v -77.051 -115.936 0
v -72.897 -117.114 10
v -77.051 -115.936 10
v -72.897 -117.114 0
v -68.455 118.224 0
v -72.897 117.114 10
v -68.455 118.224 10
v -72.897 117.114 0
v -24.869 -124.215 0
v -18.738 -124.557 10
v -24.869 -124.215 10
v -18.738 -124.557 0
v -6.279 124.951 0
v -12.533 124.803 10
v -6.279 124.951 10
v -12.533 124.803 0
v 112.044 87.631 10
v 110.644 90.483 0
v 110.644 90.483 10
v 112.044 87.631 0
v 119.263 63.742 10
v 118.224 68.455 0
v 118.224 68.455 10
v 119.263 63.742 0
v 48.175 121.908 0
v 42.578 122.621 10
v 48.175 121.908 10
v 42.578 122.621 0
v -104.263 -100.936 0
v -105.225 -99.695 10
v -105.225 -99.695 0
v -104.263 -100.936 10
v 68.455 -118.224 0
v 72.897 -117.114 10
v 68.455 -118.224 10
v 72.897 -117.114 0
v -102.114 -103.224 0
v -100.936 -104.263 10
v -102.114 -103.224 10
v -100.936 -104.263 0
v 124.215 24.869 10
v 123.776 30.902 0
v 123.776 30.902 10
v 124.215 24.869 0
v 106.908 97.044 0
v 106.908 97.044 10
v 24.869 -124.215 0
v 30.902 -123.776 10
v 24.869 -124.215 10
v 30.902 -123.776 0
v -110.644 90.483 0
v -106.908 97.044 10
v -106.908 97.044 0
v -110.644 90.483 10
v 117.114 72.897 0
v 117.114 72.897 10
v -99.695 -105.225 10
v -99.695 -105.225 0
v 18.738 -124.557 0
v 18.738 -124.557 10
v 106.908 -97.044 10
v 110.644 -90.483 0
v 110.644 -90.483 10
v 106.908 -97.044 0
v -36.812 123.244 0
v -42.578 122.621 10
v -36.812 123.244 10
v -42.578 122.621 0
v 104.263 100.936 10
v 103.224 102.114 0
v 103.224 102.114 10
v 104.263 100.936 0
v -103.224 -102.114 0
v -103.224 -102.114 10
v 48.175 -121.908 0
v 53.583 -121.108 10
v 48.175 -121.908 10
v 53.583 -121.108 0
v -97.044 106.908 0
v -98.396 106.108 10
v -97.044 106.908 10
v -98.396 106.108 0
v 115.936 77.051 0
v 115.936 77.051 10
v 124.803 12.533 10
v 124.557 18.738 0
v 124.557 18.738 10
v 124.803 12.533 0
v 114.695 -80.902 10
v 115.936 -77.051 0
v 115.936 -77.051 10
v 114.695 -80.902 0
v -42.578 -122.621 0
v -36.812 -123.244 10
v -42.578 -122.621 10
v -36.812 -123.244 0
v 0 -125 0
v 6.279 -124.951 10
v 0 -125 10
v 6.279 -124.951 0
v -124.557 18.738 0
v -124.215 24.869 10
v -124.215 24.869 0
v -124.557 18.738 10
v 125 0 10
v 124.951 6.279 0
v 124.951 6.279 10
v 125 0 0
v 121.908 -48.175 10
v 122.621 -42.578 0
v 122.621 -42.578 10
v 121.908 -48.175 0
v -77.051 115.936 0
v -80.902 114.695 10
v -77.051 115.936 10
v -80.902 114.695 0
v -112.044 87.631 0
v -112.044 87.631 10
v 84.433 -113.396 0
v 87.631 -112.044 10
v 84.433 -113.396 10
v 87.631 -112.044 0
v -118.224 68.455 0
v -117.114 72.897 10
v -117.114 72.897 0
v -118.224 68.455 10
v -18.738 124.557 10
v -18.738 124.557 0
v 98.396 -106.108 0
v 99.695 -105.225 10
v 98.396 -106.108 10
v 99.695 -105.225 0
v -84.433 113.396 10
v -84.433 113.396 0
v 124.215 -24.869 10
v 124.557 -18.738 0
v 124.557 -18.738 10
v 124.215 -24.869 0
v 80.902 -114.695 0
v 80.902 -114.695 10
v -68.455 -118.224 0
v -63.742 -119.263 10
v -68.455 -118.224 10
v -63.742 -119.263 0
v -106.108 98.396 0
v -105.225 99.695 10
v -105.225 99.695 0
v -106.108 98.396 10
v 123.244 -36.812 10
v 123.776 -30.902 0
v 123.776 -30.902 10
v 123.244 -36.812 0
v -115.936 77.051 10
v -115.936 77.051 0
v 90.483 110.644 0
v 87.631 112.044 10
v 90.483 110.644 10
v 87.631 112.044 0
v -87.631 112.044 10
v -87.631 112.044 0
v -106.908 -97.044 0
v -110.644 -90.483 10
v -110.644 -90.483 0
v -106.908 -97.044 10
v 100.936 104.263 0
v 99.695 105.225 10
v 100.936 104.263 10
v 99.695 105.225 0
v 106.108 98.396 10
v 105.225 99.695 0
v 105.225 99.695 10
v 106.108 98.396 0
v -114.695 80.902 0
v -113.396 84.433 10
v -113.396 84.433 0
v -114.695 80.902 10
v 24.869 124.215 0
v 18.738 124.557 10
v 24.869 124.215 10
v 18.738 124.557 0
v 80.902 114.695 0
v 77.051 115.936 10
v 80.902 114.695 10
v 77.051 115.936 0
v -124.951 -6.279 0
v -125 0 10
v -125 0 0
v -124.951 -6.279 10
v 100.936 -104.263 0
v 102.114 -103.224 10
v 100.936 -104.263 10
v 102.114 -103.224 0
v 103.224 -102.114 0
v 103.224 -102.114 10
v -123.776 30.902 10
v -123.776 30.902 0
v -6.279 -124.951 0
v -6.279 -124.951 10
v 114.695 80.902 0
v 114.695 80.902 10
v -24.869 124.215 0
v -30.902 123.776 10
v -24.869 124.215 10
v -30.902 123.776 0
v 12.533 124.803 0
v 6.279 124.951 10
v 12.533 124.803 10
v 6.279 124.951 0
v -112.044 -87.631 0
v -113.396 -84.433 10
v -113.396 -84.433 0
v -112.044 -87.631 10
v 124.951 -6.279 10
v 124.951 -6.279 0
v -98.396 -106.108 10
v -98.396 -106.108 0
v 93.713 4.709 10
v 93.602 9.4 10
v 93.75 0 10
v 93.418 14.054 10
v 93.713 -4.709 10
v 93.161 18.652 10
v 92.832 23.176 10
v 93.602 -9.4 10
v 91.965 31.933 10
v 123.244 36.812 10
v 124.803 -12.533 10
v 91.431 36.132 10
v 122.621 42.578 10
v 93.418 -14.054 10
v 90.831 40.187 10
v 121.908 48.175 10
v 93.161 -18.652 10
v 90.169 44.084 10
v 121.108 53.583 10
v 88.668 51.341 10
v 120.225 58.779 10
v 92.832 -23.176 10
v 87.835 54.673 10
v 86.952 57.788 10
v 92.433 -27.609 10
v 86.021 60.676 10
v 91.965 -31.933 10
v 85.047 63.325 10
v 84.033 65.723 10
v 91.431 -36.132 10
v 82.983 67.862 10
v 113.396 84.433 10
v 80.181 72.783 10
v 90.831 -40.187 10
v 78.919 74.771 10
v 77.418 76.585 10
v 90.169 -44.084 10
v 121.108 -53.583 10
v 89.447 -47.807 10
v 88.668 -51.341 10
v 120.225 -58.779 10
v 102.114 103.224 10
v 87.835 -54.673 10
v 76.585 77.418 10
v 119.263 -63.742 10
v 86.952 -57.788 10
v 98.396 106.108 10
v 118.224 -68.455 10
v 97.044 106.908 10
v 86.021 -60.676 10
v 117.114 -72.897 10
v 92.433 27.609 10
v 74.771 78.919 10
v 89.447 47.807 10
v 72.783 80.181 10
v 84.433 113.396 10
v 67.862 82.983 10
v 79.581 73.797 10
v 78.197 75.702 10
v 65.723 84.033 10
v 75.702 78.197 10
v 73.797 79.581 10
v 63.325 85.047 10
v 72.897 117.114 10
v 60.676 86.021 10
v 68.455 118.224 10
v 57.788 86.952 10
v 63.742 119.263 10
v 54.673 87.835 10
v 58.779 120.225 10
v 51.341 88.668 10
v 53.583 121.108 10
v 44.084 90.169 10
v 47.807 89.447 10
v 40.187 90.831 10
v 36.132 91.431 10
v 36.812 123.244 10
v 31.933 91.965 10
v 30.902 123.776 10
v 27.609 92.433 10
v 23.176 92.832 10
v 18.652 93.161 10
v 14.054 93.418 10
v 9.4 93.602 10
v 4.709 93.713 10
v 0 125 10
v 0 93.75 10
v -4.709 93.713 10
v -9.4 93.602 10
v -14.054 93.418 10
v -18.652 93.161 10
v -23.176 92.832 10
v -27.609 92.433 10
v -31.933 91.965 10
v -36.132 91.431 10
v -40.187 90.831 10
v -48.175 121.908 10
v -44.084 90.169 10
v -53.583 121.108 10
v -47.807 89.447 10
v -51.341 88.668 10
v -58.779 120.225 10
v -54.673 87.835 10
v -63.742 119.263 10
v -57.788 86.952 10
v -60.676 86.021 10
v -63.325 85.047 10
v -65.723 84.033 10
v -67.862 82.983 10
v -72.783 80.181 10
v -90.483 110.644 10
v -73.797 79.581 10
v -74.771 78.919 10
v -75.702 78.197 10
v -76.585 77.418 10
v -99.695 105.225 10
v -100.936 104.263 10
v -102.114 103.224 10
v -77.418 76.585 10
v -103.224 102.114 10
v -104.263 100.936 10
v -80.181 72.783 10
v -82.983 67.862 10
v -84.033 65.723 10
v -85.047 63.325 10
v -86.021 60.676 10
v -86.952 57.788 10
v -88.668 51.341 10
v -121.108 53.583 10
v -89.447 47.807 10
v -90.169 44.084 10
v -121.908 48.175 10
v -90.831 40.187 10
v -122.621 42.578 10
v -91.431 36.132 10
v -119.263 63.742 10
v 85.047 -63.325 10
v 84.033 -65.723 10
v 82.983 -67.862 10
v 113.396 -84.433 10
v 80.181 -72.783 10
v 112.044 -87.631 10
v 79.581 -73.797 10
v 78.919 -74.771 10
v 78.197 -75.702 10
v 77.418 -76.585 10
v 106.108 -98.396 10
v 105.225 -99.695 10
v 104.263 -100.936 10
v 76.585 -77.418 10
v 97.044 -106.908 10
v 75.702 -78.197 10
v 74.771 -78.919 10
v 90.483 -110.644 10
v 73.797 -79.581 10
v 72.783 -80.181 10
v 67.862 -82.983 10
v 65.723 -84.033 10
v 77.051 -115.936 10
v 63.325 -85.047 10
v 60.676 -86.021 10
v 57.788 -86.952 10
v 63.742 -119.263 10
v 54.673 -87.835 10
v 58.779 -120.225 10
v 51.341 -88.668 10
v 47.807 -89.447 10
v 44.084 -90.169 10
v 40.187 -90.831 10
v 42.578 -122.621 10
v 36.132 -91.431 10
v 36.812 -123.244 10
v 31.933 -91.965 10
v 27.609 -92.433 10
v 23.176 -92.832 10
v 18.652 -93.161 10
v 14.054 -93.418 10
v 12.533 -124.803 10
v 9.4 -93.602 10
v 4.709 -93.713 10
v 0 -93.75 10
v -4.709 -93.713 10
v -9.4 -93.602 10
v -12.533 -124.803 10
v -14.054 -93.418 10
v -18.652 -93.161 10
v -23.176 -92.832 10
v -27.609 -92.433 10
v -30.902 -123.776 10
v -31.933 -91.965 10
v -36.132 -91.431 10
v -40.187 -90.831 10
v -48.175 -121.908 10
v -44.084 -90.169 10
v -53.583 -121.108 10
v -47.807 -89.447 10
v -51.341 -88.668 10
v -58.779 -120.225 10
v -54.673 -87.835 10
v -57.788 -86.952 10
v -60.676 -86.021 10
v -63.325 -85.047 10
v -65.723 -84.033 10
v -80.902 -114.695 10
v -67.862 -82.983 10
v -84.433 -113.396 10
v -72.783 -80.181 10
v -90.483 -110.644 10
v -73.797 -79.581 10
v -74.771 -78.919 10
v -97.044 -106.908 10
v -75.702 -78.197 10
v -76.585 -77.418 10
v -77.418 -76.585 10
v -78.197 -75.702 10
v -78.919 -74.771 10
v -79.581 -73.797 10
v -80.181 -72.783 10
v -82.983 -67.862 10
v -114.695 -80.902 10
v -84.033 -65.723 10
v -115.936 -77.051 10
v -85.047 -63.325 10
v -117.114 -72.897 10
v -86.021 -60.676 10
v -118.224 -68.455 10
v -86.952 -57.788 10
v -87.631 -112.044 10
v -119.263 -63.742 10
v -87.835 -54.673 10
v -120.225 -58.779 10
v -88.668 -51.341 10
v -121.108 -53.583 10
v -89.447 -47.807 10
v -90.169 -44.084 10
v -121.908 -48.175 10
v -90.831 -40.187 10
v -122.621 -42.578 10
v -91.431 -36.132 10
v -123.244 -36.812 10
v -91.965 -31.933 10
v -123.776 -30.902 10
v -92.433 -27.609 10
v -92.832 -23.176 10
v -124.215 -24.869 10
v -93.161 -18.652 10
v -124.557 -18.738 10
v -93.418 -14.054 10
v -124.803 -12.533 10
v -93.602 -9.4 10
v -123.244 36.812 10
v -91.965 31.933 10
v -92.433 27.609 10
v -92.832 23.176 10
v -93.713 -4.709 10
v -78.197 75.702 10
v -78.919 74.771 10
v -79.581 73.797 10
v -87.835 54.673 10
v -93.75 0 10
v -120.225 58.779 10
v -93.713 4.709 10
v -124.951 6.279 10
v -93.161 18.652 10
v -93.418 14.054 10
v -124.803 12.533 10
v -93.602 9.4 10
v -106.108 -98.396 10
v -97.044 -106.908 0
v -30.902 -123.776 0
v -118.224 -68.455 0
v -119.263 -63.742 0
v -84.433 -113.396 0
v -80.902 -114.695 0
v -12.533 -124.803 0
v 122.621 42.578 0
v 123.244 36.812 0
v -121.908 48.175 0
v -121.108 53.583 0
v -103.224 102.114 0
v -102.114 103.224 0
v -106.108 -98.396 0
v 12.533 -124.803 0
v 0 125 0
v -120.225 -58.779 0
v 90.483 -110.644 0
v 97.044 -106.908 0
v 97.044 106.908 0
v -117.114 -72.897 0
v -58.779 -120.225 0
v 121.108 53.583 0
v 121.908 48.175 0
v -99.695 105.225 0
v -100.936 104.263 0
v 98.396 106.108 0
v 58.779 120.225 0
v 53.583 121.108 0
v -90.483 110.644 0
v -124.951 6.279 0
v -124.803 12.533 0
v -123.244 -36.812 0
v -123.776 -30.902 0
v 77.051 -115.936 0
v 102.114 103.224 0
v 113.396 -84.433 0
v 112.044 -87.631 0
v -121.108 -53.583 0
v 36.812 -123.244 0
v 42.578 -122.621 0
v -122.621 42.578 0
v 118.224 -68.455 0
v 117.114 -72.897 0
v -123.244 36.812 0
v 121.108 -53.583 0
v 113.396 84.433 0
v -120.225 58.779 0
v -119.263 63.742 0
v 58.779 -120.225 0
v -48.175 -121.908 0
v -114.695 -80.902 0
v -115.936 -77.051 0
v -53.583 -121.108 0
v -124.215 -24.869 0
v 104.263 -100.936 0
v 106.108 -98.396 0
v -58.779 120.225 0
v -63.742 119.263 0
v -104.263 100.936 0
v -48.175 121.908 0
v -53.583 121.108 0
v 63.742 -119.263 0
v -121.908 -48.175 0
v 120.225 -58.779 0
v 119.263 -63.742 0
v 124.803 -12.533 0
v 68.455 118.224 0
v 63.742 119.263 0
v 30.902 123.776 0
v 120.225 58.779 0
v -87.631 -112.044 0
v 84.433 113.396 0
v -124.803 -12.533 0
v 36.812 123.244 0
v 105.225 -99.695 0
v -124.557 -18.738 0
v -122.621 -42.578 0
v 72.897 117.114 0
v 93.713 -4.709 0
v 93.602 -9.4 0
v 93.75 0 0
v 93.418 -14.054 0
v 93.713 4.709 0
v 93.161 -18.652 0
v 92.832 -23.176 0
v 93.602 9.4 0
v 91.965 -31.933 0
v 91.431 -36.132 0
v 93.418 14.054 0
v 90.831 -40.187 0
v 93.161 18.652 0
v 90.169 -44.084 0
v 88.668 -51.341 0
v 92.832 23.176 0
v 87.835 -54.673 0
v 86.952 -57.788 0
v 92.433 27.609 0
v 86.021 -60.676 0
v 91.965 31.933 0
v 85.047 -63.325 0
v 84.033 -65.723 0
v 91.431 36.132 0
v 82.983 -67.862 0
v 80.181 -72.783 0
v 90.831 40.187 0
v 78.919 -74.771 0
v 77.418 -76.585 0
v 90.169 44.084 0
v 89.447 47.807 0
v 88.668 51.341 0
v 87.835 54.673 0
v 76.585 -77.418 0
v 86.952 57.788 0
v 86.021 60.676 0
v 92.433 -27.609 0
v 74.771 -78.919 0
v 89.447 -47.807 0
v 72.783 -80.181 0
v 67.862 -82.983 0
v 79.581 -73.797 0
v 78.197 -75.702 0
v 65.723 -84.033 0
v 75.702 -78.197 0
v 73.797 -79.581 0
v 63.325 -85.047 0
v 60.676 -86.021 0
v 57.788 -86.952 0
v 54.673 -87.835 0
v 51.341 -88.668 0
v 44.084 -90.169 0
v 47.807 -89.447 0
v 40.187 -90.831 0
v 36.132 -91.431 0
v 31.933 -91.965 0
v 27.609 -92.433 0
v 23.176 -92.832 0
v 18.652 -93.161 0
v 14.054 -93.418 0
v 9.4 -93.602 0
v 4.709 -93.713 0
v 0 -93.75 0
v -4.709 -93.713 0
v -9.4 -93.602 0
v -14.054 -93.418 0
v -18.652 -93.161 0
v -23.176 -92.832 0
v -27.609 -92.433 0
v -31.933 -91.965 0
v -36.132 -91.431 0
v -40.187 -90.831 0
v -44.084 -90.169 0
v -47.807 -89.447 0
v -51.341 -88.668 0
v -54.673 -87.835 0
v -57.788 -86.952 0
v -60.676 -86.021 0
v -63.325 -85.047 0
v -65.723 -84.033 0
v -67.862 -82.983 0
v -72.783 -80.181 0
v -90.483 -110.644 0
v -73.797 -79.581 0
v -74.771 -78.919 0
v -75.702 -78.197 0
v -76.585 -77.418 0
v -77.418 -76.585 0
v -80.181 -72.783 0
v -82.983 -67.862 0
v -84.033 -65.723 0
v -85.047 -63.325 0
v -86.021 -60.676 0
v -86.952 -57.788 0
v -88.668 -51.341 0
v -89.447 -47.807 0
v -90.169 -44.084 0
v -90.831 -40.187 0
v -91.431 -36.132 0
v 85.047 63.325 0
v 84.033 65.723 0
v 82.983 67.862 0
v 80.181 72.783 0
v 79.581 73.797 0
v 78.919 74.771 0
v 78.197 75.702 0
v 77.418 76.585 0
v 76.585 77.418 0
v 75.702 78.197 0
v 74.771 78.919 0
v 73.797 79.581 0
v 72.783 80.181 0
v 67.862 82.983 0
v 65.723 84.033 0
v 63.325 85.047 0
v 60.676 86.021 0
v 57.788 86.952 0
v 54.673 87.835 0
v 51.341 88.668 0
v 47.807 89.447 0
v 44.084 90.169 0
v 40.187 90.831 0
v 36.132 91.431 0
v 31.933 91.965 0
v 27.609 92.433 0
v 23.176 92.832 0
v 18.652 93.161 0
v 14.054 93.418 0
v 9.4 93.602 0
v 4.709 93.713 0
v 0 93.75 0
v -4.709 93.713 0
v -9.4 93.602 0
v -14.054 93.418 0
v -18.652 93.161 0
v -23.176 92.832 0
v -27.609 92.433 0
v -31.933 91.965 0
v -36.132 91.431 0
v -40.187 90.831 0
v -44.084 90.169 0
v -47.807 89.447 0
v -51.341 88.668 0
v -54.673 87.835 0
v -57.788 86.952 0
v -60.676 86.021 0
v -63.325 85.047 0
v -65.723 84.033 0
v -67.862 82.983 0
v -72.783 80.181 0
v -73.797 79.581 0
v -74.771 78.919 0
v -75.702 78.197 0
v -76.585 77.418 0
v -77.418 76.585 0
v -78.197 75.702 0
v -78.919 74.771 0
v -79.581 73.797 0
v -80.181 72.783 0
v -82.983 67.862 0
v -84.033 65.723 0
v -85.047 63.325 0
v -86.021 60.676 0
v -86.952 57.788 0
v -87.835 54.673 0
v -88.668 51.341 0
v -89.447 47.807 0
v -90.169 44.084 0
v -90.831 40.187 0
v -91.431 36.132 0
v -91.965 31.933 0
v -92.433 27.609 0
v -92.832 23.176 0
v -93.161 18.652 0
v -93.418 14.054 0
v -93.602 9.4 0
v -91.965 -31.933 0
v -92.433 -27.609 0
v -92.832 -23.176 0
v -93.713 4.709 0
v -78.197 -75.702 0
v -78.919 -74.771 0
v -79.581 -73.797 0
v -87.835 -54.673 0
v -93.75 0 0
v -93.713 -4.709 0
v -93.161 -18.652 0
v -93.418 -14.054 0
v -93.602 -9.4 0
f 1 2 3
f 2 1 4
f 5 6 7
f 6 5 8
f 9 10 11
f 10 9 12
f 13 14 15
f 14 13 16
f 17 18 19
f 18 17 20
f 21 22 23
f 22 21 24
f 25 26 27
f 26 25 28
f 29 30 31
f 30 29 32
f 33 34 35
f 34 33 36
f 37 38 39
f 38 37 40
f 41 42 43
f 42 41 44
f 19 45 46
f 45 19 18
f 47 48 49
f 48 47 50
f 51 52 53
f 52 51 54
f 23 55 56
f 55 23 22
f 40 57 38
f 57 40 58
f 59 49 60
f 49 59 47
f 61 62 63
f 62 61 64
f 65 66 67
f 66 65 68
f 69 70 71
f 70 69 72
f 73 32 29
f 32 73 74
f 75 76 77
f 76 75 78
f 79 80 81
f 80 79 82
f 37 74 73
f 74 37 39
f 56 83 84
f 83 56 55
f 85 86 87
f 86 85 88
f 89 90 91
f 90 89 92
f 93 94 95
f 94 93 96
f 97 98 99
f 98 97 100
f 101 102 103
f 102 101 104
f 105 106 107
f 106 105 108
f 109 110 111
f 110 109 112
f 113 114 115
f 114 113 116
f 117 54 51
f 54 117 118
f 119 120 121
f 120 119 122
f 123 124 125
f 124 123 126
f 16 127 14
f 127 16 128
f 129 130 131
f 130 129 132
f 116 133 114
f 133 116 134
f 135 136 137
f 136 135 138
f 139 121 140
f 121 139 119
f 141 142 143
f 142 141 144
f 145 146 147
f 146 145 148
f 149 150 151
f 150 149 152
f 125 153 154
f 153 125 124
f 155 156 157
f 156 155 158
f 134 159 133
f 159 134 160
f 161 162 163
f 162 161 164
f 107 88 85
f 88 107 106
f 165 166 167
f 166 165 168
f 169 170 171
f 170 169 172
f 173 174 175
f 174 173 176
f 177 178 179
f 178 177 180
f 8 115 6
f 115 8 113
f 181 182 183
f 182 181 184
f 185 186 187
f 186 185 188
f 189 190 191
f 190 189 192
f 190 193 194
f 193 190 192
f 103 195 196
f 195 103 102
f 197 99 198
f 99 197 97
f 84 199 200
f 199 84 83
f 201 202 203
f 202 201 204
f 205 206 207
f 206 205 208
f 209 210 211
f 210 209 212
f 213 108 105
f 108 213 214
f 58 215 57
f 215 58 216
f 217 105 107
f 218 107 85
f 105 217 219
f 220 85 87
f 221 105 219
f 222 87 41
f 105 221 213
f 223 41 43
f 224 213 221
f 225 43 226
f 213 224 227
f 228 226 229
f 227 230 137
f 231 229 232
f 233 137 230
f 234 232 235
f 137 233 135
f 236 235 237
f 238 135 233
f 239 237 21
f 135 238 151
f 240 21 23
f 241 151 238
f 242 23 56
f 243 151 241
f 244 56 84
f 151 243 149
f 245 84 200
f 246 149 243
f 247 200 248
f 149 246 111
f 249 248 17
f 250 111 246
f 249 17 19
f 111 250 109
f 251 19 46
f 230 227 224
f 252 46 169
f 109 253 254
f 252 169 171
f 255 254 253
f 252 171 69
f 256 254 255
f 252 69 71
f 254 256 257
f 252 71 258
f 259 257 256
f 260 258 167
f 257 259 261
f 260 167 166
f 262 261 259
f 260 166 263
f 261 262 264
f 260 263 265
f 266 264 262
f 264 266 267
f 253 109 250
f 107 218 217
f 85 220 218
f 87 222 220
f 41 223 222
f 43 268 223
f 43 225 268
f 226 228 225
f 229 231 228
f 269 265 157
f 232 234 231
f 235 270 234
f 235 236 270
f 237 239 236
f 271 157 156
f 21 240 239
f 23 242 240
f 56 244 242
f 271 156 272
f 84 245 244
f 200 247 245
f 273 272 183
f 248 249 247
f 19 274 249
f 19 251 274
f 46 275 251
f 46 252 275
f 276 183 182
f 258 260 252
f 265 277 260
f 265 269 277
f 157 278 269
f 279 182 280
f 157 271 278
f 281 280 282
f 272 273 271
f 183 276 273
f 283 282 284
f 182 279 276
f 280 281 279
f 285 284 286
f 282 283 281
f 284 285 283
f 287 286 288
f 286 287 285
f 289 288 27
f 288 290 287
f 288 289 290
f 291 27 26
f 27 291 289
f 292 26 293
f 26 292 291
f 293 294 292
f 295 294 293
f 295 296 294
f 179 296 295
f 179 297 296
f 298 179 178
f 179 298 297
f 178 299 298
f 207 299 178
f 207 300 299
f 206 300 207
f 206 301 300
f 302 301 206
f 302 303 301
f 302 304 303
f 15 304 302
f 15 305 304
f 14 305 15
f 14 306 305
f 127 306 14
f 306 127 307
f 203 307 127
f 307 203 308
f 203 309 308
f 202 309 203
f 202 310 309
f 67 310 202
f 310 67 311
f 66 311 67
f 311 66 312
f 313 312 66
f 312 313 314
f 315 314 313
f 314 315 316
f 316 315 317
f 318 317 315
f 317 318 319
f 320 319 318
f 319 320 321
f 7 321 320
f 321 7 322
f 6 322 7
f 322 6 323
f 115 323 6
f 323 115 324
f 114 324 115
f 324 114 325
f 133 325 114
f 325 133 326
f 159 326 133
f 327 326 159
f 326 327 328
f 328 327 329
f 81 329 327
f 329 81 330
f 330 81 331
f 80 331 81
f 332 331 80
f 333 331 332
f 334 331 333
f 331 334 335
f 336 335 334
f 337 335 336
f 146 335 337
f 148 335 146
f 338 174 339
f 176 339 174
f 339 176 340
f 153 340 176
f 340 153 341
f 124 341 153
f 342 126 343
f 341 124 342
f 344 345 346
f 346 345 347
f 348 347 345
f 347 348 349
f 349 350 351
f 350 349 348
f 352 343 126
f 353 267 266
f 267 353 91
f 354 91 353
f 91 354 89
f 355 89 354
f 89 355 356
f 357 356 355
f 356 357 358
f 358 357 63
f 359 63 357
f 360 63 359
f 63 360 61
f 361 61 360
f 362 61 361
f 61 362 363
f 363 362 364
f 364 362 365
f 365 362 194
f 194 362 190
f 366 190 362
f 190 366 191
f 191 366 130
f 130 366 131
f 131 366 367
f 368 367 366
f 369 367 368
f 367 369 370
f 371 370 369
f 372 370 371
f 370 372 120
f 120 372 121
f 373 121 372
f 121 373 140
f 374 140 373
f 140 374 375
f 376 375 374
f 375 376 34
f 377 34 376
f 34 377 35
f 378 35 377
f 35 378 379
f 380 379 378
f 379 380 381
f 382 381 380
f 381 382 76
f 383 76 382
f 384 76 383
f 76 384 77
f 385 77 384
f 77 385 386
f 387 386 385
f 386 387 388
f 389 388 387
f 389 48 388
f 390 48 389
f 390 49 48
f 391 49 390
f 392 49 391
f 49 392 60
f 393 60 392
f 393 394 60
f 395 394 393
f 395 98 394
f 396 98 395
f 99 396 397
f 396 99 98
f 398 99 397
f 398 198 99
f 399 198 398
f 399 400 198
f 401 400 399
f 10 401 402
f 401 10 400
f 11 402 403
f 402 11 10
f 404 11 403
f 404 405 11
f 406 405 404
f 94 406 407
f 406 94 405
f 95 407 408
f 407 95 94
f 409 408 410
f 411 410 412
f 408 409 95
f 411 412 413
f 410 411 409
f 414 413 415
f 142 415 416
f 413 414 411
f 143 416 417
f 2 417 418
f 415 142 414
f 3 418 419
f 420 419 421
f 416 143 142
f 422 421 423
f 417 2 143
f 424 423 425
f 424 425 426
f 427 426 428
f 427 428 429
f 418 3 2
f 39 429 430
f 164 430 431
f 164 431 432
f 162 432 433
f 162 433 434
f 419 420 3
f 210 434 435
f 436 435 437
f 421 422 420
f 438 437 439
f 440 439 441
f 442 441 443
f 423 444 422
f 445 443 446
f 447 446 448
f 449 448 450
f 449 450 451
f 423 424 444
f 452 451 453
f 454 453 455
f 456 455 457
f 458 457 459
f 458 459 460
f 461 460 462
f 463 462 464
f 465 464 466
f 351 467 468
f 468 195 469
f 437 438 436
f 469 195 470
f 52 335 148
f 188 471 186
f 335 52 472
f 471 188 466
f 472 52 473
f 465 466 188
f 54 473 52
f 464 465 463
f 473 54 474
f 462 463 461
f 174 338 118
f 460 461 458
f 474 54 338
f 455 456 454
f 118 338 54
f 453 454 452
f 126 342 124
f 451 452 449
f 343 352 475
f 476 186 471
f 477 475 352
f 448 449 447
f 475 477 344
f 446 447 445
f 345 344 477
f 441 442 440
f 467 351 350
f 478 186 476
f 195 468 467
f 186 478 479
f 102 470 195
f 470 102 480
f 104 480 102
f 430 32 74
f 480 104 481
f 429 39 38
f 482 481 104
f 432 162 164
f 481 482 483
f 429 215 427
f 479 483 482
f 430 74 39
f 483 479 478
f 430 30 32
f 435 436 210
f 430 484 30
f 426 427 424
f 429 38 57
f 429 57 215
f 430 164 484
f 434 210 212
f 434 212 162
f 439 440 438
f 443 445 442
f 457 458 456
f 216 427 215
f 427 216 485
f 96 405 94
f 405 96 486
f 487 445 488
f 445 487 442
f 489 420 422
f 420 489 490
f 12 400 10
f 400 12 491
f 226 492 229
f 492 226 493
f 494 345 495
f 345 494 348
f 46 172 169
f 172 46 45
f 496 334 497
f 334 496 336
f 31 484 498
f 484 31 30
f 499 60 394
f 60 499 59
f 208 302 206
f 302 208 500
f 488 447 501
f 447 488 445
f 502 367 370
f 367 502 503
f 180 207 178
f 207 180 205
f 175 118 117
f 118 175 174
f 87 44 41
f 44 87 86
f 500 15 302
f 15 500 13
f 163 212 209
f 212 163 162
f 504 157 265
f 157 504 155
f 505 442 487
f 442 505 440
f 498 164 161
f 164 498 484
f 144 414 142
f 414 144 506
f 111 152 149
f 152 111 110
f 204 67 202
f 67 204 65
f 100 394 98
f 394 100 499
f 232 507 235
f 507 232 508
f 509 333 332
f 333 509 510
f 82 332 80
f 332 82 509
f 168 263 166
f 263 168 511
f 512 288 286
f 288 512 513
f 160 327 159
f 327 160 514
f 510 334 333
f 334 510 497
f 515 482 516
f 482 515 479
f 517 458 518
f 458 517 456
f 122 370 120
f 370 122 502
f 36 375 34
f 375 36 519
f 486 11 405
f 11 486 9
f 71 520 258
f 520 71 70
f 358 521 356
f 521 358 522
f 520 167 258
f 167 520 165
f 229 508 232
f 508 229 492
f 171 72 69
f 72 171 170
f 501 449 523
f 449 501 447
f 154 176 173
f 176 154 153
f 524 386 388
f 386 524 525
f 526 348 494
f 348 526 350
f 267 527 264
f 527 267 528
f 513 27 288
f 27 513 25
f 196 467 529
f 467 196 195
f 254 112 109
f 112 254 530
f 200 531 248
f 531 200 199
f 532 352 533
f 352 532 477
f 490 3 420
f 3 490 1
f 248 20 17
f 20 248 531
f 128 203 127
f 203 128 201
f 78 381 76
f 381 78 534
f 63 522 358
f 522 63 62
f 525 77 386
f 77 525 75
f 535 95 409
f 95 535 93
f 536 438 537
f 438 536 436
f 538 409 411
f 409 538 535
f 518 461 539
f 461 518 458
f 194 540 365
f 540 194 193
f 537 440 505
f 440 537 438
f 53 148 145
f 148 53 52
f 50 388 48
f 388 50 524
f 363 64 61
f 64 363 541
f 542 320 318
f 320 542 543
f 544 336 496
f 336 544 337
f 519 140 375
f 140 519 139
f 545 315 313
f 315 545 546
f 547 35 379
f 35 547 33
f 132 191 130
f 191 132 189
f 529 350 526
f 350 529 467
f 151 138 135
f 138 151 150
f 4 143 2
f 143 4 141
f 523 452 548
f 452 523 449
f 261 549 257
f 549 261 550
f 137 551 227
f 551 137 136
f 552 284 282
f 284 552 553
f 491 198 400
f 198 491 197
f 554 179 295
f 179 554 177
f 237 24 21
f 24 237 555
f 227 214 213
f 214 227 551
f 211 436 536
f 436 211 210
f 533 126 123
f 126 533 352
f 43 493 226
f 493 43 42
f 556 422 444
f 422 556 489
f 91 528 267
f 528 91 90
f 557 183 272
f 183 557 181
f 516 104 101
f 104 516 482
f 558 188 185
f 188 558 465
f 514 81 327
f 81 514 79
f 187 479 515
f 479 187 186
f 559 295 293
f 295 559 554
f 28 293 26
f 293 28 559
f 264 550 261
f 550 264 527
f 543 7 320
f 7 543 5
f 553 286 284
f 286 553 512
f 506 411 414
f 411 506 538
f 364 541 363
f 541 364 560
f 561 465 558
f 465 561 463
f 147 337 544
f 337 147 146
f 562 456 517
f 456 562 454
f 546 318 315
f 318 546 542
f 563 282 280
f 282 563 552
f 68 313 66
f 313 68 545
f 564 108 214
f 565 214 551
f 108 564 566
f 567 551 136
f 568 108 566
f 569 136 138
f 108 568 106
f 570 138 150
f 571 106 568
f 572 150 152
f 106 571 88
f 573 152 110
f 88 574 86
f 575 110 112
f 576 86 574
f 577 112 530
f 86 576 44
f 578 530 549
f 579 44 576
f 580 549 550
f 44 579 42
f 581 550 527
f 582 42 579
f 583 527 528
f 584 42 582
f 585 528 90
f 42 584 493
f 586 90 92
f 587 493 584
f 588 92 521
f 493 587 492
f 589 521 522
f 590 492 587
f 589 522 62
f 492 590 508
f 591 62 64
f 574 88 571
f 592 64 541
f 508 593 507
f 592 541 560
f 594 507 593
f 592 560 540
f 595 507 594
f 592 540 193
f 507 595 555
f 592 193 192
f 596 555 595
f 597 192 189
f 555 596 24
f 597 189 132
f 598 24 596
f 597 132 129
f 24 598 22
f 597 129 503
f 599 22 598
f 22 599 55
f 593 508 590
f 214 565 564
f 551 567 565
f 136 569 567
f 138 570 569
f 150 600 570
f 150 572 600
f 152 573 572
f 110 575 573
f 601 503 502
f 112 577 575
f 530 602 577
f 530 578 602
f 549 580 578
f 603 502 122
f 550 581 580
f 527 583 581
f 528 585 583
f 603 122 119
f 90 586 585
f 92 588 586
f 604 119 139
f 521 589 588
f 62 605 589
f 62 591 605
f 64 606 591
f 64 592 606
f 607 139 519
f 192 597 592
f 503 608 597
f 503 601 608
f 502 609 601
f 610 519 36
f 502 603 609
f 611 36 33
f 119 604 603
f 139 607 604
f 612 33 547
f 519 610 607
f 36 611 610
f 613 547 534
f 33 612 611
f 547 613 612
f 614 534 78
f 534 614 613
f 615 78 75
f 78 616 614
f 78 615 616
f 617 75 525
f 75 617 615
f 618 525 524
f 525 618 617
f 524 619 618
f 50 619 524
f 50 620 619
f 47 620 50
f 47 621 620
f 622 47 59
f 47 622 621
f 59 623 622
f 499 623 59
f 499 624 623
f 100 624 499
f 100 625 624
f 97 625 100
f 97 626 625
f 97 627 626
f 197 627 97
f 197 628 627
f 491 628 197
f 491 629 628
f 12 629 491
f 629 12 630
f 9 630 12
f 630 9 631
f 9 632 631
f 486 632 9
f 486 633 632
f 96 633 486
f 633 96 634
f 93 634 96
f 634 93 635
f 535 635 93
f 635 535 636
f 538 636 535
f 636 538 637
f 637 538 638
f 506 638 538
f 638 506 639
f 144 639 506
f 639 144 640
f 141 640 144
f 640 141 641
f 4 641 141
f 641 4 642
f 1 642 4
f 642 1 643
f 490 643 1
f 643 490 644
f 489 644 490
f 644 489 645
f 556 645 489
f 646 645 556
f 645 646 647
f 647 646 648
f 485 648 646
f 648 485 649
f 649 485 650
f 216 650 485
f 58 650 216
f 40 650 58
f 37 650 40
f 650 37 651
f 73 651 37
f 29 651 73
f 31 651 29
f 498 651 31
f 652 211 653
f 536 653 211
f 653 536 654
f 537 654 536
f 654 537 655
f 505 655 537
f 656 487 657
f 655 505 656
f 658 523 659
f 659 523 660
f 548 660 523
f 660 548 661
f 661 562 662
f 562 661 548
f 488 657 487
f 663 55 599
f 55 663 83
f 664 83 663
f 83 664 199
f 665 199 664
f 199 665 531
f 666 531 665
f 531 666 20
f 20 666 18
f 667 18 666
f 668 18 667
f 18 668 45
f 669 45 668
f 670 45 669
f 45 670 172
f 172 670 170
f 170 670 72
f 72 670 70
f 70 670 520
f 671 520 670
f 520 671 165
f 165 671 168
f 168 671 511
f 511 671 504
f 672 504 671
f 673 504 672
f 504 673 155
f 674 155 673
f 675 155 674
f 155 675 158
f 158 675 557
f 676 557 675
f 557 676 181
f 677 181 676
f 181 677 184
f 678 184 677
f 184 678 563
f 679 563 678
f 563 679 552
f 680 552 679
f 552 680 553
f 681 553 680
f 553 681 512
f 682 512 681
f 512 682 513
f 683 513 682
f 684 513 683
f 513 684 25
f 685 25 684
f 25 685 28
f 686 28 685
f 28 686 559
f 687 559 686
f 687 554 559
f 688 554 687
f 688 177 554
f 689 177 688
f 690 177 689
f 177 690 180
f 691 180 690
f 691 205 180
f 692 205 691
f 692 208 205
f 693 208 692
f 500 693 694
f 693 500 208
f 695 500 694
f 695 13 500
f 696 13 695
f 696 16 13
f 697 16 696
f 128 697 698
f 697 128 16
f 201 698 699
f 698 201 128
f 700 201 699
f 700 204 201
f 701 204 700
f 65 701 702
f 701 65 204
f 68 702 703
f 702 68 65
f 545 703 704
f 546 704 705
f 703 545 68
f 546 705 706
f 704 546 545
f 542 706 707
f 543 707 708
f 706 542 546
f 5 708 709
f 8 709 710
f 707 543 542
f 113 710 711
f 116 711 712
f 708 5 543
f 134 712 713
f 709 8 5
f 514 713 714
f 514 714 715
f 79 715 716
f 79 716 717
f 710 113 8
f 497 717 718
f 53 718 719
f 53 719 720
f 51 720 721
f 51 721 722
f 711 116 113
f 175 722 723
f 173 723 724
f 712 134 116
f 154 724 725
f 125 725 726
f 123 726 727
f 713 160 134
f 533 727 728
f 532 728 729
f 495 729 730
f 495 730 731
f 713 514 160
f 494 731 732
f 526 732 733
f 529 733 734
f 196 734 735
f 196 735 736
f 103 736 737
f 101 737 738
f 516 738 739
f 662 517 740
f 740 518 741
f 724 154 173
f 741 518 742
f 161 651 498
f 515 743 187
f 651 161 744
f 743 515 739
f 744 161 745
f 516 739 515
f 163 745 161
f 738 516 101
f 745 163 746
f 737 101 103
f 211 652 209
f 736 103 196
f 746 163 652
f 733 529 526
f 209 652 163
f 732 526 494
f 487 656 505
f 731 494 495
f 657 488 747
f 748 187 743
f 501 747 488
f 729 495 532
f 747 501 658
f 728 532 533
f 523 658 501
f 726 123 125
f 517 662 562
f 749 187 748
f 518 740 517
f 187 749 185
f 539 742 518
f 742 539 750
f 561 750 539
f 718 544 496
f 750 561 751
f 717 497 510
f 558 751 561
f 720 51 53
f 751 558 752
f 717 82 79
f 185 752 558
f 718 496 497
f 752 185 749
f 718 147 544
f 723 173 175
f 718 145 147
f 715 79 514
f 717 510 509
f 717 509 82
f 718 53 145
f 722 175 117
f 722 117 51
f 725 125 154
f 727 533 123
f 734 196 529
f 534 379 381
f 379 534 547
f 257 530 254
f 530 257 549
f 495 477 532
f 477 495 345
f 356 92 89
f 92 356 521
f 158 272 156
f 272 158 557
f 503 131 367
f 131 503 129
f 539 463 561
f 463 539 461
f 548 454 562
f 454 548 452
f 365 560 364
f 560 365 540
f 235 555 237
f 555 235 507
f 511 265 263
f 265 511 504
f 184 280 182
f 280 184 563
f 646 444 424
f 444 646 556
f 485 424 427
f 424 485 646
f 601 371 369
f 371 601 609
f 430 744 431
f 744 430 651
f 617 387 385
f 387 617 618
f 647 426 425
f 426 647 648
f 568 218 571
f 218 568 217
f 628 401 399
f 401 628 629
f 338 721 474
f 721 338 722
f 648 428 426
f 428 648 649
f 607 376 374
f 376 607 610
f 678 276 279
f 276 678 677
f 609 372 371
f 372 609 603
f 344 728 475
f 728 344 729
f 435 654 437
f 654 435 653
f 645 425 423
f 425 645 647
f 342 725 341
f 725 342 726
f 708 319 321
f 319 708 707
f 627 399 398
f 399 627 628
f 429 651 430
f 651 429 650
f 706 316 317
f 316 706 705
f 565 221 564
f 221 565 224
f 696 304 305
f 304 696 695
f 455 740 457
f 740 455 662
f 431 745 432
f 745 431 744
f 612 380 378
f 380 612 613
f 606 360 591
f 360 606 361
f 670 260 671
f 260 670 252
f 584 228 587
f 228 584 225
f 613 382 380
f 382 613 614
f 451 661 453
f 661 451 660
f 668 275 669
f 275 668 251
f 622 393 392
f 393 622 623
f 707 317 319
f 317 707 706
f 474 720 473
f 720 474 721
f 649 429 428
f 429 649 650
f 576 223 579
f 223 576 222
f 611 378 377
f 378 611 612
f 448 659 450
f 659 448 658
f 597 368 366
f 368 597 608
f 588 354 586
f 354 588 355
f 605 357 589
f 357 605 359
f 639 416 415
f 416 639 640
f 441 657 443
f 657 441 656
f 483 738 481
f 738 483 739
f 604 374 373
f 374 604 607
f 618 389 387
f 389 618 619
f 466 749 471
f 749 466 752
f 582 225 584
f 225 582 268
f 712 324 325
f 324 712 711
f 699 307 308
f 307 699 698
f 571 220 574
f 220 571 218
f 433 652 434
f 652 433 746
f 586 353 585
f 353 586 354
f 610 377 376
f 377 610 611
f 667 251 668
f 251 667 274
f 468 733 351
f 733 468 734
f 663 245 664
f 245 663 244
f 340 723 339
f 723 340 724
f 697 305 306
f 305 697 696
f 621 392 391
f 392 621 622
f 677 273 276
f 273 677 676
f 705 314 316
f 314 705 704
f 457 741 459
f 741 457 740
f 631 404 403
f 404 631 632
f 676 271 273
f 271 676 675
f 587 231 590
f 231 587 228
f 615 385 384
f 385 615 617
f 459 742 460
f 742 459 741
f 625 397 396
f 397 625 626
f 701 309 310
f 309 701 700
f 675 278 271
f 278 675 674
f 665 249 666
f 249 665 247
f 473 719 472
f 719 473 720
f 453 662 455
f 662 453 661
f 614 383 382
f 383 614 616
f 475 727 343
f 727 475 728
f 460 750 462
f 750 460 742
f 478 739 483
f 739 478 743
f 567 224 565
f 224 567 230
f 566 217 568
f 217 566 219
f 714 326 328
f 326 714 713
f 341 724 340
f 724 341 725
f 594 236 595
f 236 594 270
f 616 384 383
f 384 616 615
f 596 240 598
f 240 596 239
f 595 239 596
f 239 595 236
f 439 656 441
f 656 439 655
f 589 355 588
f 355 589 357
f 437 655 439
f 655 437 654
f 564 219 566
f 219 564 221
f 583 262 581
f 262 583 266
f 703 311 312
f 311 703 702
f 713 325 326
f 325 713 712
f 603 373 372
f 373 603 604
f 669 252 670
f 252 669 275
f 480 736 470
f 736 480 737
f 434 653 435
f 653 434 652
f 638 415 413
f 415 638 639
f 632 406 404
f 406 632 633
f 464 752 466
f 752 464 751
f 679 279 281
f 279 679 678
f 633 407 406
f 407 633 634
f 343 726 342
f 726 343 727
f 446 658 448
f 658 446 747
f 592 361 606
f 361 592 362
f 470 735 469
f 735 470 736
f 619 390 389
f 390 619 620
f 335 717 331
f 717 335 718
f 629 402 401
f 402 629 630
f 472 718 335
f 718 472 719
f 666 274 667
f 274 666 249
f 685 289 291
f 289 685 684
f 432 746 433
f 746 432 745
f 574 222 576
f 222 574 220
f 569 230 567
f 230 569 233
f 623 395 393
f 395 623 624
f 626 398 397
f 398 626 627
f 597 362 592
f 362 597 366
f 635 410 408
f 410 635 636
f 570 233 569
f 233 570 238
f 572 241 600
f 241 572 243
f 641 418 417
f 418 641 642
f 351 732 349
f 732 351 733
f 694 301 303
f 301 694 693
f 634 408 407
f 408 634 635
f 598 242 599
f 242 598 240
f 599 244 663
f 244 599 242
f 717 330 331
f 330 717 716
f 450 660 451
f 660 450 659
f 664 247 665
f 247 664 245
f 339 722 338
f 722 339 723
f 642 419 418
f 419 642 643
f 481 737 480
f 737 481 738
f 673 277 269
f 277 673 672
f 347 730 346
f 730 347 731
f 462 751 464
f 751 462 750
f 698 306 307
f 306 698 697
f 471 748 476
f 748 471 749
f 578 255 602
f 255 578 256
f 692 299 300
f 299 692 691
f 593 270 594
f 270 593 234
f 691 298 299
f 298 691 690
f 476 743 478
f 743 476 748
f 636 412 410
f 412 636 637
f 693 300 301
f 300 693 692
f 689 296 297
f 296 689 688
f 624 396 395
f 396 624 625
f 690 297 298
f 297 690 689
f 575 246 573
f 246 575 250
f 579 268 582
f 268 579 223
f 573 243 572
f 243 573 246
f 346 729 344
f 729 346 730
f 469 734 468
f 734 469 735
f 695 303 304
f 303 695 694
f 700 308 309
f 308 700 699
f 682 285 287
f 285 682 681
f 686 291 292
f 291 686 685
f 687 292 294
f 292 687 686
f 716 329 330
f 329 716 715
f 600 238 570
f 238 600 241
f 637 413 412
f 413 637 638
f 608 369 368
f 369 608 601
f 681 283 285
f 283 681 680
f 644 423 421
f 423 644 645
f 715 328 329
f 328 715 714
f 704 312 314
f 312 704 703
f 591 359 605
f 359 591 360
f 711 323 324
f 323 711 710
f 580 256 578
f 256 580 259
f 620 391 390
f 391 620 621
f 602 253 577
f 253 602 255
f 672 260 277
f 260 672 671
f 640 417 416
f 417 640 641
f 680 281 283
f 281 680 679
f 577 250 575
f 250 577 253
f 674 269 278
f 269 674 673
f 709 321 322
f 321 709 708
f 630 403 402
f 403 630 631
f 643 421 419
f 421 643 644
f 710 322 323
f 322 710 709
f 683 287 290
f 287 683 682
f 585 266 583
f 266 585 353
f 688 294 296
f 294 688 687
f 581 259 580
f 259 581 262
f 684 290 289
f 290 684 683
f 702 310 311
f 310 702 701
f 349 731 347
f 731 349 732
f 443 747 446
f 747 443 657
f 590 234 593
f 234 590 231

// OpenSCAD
$fn=100;

scale([5, 5, 1]) difference() {
    color("brown") linear_extrude (10) hull() {
        color("red")    translate([  0,  20]) scale([4, 1]) circle(5);
        color("green")  translate([  0, -20]) scale([4, 1]) circle(5);
        color("blue")   translate([-20,   0]) scale([1, 4]) circle(5);
        color("yellow") translate([ 20,   0]) scale([1, 4]) circle(5);

        color("cyan") translate([ 17,  17])  circle(5);
        color("cyan") translate([ 17, -17])  circle(5);
        color("cyan") translate([-17,  17]) circle(5);
        color("cyan") translate([-17, -17]) circle(5);
    }

    color ("black") translate([0, 0, -5]) scale([0.75, 0.75, 2]) linear_extrude(10) hull() {
        color("red")    translate([  0,  20]) scale([4, 1]) circle(5);
        color("green")  translate([  0, -20]) scale([4, 1]) circle(5);
        color("blue")   translate([-20,   0]) scale([1, 4]) circle(5);
        color("yellow") translate([ 20,   0]) scale([1, 4]) circle(5);

        color("cyan") translate([ 17,  17])  circle(5);
        color("cyan") translate([ 17, -17])  circle(5);
        color("cyan") translate([-17,  17]) circle(5);
        color("cyan") translate([-17, -17]) circle(5);
    }
}
